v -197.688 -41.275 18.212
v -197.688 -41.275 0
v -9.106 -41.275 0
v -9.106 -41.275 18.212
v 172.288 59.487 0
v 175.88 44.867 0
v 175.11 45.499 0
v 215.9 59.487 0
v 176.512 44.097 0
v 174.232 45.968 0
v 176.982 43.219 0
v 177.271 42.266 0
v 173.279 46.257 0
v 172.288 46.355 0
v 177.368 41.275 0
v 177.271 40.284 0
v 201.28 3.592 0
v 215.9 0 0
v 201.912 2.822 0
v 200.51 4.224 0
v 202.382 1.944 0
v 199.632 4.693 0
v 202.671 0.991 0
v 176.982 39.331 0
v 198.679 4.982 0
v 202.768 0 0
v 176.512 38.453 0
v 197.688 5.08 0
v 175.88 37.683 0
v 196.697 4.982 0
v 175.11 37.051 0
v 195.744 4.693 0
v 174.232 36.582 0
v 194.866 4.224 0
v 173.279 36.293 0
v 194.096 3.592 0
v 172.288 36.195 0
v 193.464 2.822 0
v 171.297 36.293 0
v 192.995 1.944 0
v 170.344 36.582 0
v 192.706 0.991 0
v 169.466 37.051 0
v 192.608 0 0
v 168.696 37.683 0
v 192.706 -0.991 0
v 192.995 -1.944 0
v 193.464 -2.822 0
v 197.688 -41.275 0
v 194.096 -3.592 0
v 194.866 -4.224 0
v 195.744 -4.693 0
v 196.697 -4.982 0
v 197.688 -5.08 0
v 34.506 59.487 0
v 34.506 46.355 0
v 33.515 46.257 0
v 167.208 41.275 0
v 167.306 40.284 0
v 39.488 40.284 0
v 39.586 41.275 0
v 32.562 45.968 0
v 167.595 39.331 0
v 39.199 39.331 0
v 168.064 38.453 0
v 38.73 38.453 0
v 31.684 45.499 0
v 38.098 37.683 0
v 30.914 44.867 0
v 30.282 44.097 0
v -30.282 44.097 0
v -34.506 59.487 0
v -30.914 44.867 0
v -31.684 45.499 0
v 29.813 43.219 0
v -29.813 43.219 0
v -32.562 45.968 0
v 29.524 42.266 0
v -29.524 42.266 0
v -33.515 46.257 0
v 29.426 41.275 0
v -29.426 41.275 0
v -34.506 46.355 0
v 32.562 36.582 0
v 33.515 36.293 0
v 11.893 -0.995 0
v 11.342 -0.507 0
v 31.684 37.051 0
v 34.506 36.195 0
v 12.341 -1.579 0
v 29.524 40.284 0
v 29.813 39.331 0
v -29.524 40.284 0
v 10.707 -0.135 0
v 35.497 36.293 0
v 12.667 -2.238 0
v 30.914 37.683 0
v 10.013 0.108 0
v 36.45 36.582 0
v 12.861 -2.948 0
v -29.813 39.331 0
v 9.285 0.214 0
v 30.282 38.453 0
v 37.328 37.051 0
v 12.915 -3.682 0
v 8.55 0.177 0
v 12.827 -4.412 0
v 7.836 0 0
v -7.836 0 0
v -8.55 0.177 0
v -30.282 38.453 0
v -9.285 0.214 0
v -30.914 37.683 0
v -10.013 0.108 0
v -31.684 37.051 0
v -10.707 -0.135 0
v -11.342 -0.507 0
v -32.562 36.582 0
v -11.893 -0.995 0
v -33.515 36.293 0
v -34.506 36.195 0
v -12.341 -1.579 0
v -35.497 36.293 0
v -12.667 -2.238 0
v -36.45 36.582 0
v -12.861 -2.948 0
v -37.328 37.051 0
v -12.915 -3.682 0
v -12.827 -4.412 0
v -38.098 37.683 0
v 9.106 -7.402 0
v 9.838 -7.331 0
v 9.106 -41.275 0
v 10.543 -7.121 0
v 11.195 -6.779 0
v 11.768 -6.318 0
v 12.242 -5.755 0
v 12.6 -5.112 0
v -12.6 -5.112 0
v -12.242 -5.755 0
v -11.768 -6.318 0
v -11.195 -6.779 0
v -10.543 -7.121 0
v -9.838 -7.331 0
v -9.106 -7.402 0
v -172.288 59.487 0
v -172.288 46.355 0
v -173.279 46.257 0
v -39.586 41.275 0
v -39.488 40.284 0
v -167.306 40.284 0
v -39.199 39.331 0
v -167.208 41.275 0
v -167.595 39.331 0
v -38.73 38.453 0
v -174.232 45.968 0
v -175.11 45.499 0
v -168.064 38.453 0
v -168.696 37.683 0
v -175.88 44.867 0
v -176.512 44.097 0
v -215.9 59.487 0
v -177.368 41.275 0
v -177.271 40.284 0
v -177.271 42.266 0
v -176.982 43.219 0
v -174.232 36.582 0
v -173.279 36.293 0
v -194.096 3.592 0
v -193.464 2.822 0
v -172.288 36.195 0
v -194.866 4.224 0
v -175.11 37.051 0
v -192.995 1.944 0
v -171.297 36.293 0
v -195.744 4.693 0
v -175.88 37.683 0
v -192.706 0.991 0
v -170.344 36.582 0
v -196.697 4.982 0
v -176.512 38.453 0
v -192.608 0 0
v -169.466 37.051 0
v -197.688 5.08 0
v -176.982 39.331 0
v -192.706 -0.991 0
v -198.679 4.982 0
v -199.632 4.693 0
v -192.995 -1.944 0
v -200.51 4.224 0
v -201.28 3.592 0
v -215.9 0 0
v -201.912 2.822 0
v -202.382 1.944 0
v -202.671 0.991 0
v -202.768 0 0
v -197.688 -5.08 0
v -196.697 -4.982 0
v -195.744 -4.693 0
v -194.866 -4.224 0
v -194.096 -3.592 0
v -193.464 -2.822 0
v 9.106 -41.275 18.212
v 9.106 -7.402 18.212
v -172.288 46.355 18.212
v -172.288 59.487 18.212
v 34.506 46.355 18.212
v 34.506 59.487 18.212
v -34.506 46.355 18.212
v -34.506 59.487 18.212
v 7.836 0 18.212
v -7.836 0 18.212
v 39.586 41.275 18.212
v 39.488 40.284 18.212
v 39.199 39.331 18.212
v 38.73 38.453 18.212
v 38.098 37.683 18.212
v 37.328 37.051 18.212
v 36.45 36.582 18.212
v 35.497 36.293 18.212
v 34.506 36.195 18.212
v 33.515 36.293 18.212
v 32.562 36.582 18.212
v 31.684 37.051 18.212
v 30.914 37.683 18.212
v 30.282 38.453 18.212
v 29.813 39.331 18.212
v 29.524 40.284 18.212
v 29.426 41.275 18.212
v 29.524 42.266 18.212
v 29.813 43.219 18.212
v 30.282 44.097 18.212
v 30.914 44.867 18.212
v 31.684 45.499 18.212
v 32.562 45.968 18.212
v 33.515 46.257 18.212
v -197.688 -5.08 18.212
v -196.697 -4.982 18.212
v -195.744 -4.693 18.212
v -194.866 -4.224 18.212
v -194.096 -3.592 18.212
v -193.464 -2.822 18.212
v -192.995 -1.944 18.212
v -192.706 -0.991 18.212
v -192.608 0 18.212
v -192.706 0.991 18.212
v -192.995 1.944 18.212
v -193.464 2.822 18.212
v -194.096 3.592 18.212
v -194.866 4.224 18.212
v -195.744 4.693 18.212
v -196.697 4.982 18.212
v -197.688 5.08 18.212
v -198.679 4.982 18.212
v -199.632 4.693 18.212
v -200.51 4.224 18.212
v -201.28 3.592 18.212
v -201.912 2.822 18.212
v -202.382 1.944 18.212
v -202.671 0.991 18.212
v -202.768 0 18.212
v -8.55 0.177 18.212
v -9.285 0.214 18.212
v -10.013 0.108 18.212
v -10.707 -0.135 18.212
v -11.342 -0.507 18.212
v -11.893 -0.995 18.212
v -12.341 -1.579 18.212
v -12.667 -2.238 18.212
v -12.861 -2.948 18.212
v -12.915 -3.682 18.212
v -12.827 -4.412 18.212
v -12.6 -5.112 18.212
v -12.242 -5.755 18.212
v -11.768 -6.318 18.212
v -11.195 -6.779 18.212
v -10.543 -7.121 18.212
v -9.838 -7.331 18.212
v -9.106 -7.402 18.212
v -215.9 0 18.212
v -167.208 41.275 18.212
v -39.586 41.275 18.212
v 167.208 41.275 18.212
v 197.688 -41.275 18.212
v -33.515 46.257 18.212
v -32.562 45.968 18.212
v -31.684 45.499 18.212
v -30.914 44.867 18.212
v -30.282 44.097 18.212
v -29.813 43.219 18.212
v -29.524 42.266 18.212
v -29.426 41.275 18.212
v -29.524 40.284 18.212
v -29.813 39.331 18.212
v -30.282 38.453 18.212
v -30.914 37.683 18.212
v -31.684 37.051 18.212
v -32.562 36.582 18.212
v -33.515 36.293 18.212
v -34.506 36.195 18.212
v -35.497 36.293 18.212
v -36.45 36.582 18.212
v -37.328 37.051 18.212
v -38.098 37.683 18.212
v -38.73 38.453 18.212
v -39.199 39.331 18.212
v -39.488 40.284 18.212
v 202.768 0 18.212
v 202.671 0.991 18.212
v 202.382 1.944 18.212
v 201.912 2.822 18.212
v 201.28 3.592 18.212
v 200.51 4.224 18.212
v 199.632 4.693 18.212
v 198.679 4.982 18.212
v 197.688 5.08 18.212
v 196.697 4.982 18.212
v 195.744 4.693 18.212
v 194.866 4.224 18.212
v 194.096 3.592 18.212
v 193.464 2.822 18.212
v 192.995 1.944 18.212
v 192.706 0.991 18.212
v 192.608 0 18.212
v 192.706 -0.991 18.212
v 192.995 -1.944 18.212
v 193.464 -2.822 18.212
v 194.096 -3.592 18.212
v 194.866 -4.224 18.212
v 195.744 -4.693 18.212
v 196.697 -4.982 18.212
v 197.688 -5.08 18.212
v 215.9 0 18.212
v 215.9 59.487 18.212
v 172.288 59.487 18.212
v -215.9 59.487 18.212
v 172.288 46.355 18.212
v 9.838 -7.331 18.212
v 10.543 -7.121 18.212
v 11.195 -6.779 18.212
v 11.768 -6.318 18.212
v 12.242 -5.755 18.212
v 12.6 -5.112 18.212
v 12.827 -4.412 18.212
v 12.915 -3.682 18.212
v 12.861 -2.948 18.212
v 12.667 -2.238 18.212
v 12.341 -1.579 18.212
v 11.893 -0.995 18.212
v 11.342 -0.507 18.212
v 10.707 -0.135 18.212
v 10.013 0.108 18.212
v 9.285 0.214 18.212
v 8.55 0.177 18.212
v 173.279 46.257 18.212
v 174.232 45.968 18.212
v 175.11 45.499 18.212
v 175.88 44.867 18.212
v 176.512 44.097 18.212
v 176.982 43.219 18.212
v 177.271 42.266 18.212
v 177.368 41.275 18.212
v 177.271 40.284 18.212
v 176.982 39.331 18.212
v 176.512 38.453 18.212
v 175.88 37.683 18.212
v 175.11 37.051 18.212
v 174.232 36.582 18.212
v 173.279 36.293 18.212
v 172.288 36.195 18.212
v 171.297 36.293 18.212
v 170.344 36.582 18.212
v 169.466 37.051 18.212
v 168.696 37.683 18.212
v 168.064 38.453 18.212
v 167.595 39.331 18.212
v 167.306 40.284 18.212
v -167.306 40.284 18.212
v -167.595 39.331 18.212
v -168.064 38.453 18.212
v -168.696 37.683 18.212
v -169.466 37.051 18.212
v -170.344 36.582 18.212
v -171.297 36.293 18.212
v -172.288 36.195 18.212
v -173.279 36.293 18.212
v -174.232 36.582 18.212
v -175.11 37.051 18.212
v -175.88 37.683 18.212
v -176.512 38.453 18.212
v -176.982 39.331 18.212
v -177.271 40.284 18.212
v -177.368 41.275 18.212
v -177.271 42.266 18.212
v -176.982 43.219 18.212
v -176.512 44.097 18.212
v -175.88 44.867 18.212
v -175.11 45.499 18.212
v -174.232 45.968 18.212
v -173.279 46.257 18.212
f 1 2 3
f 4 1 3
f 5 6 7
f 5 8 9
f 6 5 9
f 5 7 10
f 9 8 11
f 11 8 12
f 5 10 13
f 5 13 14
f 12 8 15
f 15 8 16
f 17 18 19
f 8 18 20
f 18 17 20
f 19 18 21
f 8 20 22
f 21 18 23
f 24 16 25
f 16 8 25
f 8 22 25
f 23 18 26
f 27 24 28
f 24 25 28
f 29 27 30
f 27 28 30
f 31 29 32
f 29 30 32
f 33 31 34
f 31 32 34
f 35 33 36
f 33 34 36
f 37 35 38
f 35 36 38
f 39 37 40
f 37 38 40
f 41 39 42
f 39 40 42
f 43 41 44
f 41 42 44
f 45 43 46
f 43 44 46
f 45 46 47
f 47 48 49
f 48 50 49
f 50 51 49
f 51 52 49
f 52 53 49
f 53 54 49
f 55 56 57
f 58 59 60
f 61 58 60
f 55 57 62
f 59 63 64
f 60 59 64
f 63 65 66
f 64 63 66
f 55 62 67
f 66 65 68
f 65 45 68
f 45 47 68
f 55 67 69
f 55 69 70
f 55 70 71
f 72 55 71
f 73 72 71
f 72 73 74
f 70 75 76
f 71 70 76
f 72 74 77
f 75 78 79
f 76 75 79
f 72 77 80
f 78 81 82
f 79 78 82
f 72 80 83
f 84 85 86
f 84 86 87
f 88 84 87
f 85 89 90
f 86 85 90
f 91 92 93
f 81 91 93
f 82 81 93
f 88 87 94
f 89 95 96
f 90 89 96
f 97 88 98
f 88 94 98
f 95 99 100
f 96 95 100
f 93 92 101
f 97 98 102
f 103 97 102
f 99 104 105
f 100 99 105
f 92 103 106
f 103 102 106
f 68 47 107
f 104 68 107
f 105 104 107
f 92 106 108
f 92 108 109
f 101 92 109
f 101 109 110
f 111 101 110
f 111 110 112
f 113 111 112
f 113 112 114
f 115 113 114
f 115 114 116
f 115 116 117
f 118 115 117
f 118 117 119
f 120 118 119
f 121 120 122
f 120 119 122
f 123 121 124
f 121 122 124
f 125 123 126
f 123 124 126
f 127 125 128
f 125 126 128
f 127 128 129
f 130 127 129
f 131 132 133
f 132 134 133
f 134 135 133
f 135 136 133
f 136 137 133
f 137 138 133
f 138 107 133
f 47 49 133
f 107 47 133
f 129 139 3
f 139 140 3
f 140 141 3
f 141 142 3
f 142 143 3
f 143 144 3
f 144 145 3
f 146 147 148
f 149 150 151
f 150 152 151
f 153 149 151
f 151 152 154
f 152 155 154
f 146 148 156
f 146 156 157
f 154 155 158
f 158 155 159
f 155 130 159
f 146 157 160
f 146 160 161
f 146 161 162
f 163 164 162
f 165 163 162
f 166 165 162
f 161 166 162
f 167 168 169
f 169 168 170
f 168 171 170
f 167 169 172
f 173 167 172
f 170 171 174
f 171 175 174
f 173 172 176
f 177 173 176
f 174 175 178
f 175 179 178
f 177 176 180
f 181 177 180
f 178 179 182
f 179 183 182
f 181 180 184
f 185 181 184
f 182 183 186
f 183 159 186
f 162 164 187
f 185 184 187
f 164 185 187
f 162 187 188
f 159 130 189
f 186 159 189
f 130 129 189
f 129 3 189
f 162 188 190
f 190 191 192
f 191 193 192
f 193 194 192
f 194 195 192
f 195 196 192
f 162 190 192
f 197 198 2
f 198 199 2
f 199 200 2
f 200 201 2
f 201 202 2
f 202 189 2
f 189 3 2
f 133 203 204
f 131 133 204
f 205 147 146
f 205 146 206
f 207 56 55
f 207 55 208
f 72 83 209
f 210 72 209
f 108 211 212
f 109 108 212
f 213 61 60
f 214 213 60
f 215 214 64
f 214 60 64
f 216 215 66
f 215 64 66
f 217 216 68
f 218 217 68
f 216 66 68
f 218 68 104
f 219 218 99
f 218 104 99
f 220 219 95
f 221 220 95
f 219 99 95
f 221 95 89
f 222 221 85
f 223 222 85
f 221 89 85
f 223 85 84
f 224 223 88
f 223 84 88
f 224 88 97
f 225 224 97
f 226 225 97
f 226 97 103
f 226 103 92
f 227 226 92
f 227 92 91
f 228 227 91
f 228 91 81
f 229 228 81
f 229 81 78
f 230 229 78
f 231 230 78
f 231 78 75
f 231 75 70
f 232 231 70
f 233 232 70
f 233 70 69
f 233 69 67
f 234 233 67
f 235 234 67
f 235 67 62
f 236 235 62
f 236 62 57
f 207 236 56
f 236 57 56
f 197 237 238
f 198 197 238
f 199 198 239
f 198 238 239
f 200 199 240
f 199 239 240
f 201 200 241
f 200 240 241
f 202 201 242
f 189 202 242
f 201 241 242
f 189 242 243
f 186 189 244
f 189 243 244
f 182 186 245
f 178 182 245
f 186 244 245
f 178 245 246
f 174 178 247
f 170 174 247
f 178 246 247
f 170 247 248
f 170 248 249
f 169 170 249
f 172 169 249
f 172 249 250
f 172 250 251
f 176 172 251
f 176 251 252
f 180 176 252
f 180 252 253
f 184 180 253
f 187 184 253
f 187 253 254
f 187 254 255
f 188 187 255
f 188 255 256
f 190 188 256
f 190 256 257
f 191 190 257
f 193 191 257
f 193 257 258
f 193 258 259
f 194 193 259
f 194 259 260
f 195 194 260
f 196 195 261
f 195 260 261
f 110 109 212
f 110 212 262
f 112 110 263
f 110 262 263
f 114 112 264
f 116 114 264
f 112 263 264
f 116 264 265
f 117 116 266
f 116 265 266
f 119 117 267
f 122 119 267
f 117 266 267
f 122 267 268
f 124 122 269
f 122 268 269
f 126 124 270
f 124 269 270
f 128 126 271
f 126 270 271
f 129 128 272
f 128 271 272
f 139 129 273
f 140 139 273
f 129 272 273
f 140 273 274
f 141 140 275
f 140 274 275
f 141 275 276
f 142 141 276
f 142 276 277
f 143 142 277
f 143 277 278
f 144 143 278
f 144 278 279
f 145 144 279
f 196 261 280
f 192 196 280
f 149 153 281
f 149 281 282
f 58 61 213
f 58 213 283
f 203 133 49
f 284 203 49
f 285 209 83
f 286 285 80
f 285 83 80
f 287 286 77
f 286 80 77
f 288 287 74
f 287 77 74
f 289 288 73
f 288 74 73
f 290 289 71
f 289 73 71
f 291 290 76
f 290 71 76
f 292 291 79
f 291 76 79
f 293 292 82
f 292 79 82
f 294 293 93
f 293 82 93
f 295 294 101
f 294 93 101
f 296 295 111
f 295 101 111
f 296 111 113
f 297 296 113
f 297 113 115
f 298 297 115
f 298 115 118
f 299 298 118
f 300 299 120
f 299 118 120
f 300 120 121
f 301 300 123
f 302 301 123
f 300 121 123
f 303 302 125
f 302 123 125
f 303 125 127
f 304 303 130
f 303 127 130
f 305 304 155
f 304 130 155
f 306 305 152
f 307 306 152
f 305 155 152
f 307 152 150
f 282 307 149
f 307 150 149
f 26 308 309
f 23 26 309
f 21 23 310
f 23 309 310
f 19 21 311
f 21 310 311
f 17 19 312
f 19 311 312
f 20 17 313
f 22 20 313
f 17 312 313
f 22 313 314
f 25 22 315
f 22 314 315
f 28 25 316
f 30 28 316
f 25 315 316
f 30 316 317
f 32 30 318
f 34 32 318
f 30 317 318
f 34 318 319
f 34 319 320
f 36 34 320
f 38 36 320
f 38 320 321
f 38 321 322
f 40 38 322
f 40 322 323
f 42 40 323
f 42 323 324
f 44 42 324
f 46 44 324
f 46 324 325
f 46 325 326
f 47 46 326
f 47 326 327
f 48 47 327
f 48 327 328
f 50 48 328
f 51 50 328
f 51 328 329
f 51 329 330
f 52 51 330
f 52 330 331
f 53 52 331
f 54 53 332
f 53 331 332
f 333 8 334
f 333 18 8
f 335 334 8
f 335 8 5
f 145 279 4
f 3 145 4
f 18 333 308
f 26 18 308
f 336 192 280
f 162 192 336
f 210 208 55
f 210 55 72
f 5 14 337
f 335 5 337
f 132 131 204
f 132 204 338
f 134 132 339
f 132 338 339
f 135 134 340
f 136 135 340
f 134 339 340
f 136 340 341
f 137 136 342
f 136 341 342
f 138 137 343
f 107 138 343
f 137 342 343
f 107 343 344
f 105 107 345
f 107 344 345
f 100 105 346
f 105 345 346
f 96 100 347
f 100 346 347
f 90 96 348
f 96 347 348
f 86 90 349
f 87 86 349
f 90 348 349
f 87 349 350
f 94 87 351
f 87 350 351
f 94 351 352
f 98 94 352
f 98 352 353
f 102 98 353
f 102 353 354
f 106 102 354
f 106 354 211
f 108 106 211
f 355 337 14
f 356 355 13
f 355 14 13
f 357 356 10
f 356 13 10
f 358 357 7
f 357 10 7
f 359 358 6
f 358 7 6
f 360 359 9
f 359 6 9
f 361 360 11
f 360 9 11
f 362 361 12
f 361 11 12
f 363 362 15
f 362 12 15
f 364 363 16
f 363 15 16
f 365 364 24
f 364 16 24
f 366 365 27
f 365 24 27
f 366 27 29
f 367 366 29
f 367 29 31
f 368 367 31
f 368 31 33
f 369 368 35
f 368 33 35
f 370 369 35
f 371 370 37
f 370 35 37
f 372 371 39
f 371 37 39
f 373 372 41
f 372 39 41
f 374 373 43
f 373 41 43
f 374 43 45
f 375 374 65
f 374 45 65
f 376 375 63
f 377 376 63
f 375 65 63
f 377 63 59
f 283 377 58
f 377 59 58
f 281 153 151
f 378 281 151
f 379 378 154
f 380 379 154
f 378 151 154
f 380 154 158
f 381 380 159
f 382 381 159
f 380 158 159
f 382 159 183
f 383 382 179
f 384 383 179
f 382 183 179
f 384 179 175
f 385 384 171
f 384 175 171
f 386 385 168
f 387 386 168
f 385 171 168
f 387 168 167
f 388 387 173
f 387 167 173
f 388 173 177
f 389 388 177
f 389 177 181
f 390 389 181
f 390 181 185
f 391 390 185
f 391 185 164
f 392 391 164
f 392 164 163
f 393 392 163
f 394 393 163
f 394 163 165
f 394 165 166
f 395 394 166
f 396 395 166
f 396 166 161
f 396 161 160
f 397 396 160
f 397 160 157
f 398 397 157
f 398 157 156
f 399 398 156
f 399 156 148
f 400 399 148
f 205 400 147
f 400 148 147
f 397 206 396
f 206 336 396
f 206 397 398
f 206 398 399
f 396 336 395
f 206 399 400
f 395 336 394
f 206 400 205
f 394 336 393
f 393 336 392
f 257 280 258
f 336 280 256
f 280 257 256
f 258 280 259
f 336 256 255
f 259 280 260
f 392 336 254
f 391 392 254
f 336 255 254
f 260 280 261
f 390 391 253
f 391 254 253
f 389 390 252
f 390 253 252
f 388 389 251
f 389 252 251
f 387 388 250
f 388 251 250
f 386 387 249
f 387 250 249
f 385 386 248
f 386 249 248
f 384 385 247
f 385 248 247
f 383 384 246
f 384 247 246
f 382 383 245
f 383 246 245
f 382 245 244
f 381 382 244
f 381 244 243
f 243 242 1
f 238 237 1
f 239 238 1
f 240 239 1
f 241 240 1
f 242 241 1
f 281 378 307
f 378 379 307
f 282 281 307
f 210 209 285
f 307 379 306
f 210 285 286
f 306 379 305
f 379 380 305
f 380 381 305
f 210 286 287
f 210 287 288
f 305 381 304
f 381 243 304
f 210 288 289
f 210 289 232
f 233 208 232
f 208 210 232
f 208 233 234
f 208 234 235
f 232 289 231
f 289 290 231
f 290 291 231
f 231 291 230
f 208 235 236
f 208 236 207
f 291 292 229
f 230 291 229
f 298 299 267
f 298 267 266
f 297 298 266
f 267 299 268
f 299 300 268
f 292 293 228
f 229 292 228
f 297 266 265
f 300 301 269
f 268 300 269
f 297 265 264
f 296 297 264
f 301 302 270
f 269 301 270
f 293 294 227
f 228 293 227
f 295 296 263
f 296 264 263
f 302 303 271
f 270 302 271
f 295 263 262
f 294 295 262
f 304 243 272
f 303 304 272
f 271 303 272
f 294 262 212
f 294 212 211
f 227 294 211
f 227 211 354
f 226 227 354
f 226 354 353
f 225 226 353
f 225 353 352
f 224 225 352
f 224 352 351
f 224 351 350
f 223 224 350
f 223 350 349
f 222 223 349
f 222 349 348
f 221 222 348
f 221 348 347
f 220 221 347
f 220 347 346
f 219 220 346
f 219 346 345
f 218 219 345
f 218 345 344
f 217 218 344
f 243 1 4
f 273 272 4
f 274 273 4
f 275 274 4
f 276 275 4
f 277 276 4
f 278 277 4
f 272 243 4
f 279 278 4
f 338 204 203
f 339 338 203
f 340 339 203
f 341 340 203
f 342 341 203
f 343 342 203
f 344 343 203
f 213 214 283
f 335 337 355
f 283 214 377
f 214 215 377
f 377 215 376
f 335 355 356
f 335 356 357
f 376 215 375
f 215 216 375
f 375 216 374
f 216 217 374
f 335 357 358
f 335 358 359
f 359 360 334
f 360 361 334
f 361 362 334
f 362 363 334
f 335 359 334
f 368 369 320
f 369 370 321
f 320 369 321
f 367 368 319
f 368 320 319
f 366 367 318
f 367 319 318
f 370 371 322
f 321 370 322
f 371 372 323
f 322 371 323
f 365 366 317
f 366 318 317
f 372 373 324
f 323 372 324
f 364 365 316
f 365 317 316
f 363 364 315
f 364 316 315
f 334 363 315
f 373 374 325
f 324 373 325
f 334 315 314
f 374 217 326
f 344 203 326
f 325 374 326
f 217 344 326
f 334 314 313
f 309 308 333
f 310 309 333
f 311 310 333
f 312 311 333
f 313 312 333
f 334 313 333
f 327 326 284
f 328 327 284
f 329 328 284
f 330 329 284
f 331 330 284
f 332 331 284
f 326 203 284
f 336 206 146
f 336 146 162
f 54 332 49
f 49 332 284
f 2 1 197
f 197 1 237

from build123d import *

# Parameters (mm, degrees)
F1_W      = 431.8
F1_H      = 82.55
F2_DEPTH  = 18.2118
F4_DEPTH  = 18.2128
F6_DEPTH  = 18.2128
F7_W      = 18.2118
F7_H      = 18.2118
F7_W_2    = 25.4
F8_DEPTH  = 18.2118
F9_R      = 5.08
F10_DEPTH = 18.2128


# Not quite as in the source:
# - a variable given as a bare number and used for a length is read in inches; the dataset says mm whatever the document's units were
# - a feature names something its author has since deleted; it is built from what else it names


with BuildPart() as f2:
    # F1 (on Top) → F2 (new body)
    with BuildSketch(Plane.XY):
        Rectangle(F1_W, F1_H)
    extrude(amount=F2_DEPTH)

    # F3 (on face) → F4 (cut, through all)
    with BuildSketch(Plane.XY.offset(18.2118)):
        Polygon((-215.9, 0), (-215.9, -41.275), (-197.6882, -41.275), (-197.6882, -5.08), (-197.6882, 0), (-202.7682, 0), align=None)
        with BuildLine():
            Line((-197.6882, 0), (-197.6882, -5.08))
            ThreePointArc((-197.6882, -5.08), (-194.0960975516, 3.5921024484), (-202.7682, 0))
            Line((-202.7682, 0), (-197.6882, 0))
        make_face()
        with BuildLine():
            Line((197.6882, 0), (202.7682, 0))
            ThreePointArc((202.7682, 0), (194.0960975516, 3.5921024484), (197.6882, -5.08))
            Line((197.6882, -5.08), (197.6882, 0))
        make_face()
        Polygon((197.6882, -5.08), (197.6882, -41.275), (215.9, -41.275), (215.9, 0), (202.7682, 0), (197.6882, 0), align=None)
    extrude(amount=-F4_DEPTH, mode=Mode.SUBTRACT)

    # F5 (on face) → F6 (cut, through all)
    with BuildSketch(Plane.XY.offset(18.2118)):
        Polygon((-9.1059, -7.4021024484), (-9.1059, -41.275), (9.1059, -41.275), (9.1059, -7.4021024484), (9.1059, 0), (7.8359, 0), (-7.8359, 0), (-9.1059, 0), align=None)
        with BuildLine():
            ThreePointArc((-7.8359, 0), (-12.8610305123, -2.9478239095), (-9.1059, -7.4021024484))
            Line((-9.1059, -7.4021024484), (-9.1059, 0))
            Line((-9.1059, 0), (-7.8359, 0))
        make_face()
        with BuildLine():
            Line((9.1059, 0), (9.1059, -7.4021024484))
            ThreePointArc((9.1059, -7.4021024484), (12.8610305123, -2.9478239095), (7.8359, 0))
            Line((7.8359, 0), (9.1059, 0))
        make_face()
    extrude(amount=-F6_DEPTH, mode=Mode.SUBTRACT)

    # F7 (on face) → F8 (join)
    with BuildSketch(Plane(origin=(0, 41.275, 0), x_dir=(-1, 0, 0), z_dir=(0, 1, 0))):
        with Locations((0, 9.1059)):
            Rectangle(F7_W, F7_H)
        with Locations((-21.8059, 9.1059)):
            Rectangle(F7_W_2, F7_H)
        with Locations((21.8059, 9.1059)):
            Rectangle(F7_W_2, F7_H)
        with Locations((-206.7941, 9.1059)):
            Rectangle(F7_W, F7_H)
        with Locations((-184.9882, 9.1059)):
            Rectangle(F7_W_2, F7_H)
        with Locations((184.9882, 9.1059)):
            Rectangle(F7_W_2, F7_H)
        with Locations((206.7941, 9.1059)):
            Rectangle(F7_W, F7_H)
    extrude(amount=F8_DEPTH)

    # F9 (on face) → F10 (cut, through all)
    with BuildSketch(Plane(origin=(0, 0, 0), x_dir=(1, 0, 0), z_dir=(0, 0, -1))):
        with Locations((34.5059, -41.275)):
            Circle(F9_R)
        with Locations((-34.5059, -41.275)):
            Circle(F9_R)
        with Locations((172.2882, -41.275)):
            Circle(F9_R)
        with Locations((-172.2882, -41.275)):
            Circle(F9_R)
    extrude(amount=-F10_DEPTH, mode=Mode.SUBTRACT)


solid = f2.part
